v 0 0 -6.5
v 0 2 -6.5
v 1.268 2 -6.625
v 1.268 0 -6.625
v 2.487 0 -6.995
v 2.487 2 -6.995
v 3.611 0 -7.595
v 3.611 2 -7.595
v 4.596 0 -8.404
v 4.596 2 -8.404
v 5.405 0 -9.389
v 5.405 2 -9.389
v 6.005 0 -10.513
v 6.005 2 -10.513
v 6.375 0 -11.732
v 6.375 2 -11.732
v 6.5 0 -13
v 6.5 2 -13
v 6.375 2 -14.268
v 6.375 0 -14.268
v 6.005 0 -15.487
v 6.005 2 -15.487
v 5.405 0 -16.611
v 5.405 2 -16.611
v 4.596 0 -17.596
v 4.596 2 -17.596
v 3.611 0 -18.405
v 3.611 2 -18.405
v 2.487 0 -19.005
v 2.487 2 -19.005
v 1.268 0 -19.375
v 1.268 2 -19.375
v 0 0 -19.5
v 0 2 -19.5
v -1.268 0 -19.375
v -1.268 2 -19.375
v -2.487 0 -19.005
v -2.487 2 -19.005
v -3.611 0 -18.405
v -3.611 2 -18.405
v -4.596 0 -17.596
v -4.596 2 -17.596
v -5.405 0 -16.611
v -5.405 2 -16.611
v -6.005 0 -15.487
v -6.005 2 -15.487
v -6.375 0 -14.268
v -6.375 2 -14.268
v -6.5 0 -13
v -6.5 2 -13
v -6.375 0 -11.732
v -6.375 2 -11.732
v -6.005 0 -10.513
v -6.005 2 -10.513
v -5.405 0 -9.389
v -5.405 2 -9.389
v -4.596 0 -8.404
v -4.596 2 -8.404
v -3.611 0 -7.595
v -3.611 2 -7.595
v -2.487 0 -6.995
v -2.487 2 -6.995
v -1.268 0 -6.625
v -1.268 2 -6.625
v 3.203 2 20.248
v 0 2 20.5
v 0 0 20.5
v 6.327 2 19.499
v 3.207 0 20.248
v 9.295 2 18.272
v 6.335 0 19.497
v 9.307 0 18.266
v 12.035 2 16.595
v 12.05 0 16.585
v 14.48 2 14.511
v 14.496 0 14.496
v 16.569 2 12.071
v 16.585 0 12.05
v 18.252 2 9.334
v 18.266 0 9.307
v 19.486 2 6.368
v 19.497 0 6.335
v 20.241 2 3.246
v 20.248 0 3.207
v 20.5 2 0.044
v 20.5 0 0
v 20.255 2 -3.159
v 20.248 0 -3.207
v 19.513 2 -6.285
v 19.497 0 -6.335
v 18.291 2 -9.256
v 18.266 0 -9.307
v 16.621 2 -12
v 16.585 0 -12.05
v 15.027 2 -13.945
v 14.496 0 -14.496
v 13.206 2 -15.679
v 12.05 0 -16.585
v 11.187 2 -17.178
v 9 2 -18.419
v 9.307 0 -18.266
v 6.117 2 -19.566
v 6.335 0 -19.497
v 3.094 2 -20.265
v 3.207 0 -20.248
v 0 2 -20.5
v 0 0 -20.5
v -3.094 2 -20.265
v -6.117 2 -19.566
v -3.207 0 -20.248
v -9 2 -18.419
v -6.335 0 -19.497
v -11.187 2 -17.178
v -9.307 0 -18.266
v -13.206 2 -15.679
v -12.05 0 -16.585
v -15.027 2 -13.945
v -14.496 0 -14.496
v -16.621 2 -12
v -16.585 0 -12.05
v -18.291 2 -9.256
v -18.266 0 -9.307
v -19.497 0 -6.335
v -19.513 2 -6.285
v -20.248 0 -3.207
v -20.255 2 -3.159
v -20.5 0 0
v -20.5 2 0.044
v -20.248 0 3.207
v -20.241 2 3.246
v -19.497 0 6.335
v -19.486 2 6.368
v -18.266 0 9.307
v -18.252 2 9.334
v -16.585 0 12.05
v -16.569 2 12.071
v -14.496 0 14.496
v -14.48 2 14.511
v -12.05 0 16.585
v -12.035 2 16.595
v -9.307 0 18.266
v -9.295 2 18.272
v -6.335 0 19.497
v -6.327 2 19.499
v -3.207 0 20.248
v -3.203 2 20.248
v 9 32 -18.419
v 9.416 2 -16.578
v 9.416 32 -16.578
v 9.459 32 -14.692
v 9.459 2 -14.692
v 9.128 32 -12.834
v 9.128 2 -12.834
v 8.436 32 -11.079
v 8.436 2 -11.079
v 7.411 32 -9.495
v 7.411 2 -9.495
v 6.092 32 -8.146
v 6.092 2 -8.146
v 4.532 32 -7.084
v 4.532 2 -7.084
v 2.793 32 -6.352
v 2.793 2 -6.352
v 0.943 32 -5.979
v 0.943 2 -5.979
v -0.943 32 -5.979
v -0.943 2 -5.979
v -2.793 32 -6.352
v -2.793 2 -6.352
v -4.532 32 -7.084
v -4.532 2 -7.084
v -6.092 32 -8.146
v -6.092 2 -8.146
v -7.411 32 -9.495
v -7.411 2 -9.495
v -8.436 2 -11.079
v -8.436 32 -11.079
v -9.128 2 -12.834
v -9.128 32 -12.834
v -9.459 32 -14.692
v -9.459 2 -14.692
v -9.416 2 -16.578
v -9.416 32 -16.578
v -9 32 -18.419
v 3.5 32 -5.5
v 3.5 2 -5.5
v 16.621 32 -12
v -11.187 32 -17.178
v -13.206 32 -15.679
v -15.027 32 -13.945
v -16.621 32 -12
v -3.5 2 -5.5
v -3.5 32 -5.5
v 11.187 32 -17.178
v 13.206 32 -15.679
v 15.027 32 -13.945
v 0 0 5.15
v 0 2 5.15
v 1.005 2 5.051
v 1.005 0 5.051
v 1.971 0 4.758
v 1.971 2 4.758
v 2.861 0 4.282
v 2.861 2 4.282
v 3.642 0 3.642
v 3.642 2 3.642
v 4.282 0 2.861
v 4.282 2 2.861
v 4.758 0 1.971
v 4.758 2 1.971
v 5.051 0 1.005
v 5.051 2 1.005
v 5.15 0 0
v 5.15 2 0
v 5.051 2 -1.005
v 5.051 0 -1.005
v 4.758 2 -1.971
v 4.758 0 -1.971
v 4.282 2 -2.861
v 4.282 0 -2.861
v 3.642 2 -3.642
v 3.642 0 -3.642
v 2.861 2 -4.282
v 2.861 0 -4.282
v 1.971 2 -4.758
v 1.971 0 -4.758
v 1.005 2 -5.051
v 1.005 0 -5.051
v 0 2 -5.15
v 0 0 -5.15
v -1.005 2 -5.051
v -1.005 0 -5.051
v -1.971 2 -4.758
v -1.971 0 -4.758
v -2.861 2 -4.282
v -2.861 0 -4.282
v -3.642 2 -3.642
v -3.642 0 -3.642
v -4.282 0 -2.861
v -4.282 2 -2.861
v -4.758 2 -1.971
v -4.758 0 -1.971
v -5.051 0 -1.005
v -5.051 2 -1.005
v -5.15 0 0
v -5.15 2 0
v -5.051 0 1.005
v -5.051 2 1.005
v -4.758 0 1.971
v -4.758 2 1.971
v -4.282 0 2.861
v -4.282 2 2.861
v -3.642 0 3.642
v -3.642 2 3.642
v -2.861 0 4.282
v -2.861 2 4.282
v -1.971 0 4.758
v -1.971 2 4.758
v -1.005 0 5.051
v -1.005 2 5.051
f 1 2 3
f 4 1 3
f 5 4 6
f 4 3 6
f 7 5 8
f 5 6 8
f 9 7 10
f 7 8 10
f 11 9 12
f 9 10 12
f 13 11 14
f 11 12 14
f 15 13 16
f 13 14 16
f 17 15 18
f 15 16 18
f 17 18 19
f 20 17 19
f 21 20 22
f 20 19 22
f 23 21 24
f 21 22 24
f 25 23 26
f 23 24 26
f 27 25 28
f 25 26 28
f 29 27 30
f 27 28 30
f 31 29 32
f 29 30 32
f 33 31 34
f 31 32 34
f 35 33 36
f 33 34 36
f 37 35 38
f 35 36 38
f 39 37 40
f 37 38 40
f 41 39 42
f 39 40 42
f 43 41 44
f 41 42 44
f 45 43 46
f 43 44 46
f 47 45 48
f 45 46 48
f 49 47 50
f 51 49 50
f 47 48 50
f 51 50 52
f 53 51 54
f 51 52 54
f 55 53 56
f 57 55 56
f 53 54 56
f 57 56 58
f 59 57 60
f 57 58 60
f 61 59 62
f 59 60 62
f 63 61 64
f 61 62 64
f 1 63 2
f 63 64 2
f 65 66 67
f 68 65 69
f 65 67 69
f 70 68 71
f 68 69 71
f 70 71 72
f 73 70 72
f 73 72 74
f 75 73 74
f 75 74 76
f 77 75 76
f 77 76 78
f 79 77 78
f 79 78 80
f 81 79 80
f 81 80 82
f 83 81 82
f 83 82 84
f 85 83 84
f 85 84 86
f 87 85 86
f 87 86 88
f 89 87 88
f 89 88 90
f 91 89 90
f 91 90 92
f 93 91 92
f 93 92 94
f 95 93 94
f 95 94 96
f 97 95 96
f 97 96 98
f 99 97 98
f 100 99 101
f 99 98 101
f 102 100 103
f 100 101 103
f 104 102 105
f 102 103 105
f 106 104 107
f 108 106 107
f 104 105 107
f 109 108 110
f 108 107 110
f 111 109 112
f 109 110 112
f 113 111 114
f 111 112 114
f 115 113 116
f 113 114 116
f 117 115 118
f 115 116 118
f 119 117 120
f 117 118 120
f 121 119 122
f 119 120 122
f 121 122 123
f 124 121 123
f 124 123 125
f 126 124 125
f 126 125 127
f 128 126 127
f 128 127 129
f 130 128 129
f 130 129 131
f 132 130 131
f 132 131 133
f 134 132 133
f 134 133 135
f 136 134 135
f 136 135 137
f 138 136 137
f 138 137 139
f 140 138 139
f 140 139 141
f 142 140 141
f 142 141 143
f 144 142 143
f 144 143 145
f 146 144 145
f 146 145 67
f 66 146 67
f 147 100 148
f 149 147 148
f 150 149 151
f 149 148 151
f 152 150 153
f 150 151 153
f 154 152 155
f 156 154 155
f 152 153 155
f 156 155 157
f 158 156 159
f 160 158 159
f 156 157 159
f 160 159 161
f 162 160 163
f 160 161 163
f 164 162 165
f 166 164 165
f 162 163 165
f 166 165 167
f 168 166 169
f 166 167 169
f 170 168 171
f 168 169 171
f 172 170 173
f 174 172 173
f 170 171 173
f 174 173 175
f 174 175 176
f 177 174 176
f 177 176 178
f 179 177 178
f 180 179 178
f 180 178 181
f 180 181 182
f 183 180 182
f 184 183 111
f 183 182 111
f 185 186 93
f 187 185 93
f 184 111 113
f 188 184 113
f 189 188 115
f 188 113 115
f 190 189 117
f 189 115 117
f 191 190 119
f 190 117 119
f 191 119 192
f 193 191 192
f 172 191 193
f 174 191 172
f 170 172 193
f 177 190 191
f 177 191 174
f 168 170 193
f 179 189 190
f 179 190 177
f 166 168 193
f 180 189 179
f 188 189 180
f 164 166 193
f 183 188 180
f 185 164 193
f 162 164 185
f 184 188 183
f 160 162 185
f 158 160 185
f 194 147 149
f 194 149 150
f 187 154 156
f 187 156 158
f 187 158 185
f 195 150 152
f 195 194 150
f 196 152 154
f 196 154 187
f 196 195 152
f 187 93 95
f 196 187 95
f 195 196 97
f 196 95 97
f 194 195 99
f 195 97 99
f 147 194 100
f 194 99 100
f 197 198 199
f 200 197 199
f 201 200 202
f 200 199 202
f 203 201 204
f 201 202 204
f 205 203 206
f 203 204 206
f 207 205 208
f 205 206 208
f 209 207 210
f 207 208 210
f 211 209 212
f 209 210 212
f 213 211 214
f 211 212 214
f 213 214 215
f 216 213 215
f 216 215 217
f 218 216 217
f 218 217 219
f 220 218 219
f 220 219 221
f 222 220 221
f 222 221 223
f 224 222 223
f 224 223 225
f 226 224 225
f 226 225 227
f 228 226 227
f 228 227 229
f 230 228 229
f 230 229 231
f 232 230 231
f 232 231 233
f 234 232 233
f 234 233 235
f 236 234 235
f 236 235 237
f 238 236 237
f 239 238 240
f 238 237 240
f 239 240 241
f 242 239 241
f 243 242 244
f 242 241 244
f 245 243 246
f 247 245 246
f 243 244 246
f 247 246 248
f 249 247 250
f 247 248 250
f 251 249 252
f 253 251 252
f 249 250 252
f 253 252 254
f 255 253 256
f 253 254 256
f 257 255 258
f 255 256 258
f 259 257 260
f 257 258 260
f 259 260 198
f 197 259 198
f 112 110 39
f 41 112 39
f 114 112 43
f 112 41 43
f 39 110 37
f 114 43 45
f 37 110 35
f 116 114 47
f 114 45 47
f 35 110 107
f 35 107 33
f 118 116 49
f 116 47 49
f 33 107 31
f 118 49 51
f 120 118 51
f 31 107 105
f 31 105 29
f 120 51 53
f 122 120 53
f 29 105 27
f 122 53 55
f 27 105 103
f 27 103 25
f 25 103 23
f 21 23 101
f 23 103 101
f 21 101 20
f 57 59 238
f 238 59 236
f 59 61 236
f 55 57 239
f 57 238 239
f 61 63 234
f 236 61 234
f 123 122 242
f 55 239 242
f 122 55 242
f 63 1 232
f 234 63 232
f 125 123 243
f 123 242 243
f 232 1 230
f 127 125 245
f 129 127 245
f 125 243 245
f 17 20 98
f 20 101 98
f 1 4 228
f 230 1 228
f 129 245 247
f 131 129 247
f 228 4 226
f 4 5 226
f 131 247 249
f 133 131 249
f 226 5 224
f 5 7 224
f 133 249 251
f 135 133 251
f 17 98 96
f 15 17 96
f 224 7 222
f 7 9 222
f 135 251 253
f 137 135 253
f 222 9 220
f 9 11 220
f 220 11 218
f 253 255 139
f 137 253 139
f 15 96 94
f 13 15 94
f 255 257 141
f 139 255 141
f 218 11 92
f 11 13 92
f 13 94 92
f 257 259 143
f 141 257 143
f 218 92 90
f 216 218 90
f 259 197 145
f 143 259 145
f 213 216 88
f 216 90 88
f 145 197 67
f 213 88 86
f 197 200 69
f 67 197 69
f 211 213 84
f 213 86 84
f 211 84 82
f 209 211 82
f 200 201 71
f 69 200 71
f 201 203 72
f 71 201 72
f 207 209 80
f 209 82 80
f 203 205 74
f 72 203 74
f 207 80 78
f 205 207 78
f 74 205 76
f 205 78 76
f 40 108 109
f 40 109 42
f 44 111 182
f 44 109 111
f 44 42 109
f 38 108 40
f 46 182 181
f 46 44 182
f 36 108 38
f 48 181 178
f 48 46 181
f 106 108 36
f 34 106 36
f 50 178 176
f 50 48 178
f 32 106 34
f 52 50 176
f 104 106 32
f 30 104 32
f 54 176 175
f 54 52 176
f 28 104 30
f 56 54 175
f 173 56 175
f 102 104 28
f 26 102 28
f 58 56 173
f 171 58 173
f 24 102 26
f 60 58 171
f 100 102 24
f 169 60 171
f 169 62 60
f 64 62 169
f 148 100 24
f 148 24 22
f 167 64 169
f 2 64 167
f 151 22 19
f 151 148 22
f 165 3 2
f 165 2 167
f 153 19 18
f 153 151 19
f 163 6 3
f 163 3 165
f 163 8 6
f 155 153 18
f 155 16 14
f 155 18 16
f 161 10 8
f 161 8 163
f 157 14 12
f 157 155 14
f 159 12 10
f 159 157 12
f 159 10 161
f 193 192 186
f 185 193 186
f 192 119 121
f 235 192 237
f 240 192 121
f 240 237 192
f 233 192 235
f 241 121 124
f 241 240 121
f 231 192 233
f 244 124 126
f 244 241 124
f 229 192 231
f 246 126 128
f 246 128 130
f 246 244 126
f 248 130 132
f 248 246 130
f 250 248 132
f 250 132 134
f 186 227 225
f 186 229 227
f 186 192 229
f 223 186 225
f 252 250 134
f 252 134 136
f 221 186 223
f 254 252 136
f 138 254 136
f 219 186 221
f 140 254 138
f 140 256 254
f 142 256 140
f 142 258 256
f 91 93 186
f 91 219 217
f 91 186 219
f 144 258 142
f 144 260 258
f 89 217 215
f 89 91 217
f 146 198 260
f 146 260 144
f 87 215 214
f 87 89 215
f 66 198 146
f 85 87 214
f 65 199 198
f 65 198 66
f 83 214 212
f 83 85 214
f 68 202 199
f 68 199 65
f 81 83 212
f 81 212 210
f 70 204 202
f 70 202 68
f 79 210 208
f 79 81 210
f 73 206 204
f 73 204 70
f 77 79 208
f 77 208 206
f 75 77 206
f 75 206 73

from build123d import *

# Parameters (mm, degrees)
SKETCH1_R           = 20.5
BOSS_EXTRUDE1_DEPTH = 2
SKETCH2_R           = 5.15
CUT_EXTRUDE1_DEPTH  = 3
SKETCH3_R           = 6.5
CUT_EXTRUDE2_DEPTH  = 2
BOSS_EXTRUDE4_DEPTH = 30


with BuildPart() as part:
    # Sketch1 → Boss-Extrude1 (new body)
    with BuildSketch(Plane(origin=(0, 0, 0), x_dir=(1, 0, 0), z_dir=(0, 1, 0))):
        with Locations(Location((0, 0, 0), (0, 0, 270))):
            Circle(SKETCH1_R)
    extrude(amount=BOSS_EXTRUDE1_DEPTH)

    # Sketch2 → Cut-Extrude1 (cut)
    with BuildSketch(Plane(origin=(0, 2, 0), x_dir=(1, 0, 0), z_dir=(0, 1, 0))):
        with Locations(Location((0, 0, 0), (0, 0, 270))):
            Circle(SKETCH2_R)
    extrude(amount=-CUT_EXTRUDE1_DEPTH, mode=Mode.SUBTRACT)

    # Sketch3 → Cut-Extrude2 (cut)
    with BuildSketch(Plane(origin=(0, 2, 0), x_dir=(1, 0, 0), z_dir=(0, 1, 0))):
        with Locations(Location((0, 13, 0), (0, 0, 270))):
            Circle(SKETCH3_R)
    extrude(amount=-CUT_EXTRUDE2_DEPTH, mode=Mode.SUBTRACT)

    # Sketch4 → Boss-Extrude4 (add)
    with BuildSketch(Plane(origin=(0, 2, 0), x_dir=(1, 0, 0), z_dir=(0, 1, 0))):
        with BuildLine():
            Line((-16.620770139, 12), (-3.5, 5.5))
            Line((-3.5, 5.5), (3.5, 5.5))
            Line((3.5, 5.5), (16.620770139, 12))
            ThreePointArc((16.620770139, 12), (13.206287248, 15.679412525), (9, 18.418740456))
            ThreePointArc((9, 18.418740456), (0, 5.93152382), (-9, 18.418740456))
            ThreePointArc((-9, 18.418740456), (-13.206287248, 15.679412525), (-16.620770139, 12))
        make_face()
    extrude(amount=BOSS_EXTRUDE4_DEPTH)


solid = part.part
